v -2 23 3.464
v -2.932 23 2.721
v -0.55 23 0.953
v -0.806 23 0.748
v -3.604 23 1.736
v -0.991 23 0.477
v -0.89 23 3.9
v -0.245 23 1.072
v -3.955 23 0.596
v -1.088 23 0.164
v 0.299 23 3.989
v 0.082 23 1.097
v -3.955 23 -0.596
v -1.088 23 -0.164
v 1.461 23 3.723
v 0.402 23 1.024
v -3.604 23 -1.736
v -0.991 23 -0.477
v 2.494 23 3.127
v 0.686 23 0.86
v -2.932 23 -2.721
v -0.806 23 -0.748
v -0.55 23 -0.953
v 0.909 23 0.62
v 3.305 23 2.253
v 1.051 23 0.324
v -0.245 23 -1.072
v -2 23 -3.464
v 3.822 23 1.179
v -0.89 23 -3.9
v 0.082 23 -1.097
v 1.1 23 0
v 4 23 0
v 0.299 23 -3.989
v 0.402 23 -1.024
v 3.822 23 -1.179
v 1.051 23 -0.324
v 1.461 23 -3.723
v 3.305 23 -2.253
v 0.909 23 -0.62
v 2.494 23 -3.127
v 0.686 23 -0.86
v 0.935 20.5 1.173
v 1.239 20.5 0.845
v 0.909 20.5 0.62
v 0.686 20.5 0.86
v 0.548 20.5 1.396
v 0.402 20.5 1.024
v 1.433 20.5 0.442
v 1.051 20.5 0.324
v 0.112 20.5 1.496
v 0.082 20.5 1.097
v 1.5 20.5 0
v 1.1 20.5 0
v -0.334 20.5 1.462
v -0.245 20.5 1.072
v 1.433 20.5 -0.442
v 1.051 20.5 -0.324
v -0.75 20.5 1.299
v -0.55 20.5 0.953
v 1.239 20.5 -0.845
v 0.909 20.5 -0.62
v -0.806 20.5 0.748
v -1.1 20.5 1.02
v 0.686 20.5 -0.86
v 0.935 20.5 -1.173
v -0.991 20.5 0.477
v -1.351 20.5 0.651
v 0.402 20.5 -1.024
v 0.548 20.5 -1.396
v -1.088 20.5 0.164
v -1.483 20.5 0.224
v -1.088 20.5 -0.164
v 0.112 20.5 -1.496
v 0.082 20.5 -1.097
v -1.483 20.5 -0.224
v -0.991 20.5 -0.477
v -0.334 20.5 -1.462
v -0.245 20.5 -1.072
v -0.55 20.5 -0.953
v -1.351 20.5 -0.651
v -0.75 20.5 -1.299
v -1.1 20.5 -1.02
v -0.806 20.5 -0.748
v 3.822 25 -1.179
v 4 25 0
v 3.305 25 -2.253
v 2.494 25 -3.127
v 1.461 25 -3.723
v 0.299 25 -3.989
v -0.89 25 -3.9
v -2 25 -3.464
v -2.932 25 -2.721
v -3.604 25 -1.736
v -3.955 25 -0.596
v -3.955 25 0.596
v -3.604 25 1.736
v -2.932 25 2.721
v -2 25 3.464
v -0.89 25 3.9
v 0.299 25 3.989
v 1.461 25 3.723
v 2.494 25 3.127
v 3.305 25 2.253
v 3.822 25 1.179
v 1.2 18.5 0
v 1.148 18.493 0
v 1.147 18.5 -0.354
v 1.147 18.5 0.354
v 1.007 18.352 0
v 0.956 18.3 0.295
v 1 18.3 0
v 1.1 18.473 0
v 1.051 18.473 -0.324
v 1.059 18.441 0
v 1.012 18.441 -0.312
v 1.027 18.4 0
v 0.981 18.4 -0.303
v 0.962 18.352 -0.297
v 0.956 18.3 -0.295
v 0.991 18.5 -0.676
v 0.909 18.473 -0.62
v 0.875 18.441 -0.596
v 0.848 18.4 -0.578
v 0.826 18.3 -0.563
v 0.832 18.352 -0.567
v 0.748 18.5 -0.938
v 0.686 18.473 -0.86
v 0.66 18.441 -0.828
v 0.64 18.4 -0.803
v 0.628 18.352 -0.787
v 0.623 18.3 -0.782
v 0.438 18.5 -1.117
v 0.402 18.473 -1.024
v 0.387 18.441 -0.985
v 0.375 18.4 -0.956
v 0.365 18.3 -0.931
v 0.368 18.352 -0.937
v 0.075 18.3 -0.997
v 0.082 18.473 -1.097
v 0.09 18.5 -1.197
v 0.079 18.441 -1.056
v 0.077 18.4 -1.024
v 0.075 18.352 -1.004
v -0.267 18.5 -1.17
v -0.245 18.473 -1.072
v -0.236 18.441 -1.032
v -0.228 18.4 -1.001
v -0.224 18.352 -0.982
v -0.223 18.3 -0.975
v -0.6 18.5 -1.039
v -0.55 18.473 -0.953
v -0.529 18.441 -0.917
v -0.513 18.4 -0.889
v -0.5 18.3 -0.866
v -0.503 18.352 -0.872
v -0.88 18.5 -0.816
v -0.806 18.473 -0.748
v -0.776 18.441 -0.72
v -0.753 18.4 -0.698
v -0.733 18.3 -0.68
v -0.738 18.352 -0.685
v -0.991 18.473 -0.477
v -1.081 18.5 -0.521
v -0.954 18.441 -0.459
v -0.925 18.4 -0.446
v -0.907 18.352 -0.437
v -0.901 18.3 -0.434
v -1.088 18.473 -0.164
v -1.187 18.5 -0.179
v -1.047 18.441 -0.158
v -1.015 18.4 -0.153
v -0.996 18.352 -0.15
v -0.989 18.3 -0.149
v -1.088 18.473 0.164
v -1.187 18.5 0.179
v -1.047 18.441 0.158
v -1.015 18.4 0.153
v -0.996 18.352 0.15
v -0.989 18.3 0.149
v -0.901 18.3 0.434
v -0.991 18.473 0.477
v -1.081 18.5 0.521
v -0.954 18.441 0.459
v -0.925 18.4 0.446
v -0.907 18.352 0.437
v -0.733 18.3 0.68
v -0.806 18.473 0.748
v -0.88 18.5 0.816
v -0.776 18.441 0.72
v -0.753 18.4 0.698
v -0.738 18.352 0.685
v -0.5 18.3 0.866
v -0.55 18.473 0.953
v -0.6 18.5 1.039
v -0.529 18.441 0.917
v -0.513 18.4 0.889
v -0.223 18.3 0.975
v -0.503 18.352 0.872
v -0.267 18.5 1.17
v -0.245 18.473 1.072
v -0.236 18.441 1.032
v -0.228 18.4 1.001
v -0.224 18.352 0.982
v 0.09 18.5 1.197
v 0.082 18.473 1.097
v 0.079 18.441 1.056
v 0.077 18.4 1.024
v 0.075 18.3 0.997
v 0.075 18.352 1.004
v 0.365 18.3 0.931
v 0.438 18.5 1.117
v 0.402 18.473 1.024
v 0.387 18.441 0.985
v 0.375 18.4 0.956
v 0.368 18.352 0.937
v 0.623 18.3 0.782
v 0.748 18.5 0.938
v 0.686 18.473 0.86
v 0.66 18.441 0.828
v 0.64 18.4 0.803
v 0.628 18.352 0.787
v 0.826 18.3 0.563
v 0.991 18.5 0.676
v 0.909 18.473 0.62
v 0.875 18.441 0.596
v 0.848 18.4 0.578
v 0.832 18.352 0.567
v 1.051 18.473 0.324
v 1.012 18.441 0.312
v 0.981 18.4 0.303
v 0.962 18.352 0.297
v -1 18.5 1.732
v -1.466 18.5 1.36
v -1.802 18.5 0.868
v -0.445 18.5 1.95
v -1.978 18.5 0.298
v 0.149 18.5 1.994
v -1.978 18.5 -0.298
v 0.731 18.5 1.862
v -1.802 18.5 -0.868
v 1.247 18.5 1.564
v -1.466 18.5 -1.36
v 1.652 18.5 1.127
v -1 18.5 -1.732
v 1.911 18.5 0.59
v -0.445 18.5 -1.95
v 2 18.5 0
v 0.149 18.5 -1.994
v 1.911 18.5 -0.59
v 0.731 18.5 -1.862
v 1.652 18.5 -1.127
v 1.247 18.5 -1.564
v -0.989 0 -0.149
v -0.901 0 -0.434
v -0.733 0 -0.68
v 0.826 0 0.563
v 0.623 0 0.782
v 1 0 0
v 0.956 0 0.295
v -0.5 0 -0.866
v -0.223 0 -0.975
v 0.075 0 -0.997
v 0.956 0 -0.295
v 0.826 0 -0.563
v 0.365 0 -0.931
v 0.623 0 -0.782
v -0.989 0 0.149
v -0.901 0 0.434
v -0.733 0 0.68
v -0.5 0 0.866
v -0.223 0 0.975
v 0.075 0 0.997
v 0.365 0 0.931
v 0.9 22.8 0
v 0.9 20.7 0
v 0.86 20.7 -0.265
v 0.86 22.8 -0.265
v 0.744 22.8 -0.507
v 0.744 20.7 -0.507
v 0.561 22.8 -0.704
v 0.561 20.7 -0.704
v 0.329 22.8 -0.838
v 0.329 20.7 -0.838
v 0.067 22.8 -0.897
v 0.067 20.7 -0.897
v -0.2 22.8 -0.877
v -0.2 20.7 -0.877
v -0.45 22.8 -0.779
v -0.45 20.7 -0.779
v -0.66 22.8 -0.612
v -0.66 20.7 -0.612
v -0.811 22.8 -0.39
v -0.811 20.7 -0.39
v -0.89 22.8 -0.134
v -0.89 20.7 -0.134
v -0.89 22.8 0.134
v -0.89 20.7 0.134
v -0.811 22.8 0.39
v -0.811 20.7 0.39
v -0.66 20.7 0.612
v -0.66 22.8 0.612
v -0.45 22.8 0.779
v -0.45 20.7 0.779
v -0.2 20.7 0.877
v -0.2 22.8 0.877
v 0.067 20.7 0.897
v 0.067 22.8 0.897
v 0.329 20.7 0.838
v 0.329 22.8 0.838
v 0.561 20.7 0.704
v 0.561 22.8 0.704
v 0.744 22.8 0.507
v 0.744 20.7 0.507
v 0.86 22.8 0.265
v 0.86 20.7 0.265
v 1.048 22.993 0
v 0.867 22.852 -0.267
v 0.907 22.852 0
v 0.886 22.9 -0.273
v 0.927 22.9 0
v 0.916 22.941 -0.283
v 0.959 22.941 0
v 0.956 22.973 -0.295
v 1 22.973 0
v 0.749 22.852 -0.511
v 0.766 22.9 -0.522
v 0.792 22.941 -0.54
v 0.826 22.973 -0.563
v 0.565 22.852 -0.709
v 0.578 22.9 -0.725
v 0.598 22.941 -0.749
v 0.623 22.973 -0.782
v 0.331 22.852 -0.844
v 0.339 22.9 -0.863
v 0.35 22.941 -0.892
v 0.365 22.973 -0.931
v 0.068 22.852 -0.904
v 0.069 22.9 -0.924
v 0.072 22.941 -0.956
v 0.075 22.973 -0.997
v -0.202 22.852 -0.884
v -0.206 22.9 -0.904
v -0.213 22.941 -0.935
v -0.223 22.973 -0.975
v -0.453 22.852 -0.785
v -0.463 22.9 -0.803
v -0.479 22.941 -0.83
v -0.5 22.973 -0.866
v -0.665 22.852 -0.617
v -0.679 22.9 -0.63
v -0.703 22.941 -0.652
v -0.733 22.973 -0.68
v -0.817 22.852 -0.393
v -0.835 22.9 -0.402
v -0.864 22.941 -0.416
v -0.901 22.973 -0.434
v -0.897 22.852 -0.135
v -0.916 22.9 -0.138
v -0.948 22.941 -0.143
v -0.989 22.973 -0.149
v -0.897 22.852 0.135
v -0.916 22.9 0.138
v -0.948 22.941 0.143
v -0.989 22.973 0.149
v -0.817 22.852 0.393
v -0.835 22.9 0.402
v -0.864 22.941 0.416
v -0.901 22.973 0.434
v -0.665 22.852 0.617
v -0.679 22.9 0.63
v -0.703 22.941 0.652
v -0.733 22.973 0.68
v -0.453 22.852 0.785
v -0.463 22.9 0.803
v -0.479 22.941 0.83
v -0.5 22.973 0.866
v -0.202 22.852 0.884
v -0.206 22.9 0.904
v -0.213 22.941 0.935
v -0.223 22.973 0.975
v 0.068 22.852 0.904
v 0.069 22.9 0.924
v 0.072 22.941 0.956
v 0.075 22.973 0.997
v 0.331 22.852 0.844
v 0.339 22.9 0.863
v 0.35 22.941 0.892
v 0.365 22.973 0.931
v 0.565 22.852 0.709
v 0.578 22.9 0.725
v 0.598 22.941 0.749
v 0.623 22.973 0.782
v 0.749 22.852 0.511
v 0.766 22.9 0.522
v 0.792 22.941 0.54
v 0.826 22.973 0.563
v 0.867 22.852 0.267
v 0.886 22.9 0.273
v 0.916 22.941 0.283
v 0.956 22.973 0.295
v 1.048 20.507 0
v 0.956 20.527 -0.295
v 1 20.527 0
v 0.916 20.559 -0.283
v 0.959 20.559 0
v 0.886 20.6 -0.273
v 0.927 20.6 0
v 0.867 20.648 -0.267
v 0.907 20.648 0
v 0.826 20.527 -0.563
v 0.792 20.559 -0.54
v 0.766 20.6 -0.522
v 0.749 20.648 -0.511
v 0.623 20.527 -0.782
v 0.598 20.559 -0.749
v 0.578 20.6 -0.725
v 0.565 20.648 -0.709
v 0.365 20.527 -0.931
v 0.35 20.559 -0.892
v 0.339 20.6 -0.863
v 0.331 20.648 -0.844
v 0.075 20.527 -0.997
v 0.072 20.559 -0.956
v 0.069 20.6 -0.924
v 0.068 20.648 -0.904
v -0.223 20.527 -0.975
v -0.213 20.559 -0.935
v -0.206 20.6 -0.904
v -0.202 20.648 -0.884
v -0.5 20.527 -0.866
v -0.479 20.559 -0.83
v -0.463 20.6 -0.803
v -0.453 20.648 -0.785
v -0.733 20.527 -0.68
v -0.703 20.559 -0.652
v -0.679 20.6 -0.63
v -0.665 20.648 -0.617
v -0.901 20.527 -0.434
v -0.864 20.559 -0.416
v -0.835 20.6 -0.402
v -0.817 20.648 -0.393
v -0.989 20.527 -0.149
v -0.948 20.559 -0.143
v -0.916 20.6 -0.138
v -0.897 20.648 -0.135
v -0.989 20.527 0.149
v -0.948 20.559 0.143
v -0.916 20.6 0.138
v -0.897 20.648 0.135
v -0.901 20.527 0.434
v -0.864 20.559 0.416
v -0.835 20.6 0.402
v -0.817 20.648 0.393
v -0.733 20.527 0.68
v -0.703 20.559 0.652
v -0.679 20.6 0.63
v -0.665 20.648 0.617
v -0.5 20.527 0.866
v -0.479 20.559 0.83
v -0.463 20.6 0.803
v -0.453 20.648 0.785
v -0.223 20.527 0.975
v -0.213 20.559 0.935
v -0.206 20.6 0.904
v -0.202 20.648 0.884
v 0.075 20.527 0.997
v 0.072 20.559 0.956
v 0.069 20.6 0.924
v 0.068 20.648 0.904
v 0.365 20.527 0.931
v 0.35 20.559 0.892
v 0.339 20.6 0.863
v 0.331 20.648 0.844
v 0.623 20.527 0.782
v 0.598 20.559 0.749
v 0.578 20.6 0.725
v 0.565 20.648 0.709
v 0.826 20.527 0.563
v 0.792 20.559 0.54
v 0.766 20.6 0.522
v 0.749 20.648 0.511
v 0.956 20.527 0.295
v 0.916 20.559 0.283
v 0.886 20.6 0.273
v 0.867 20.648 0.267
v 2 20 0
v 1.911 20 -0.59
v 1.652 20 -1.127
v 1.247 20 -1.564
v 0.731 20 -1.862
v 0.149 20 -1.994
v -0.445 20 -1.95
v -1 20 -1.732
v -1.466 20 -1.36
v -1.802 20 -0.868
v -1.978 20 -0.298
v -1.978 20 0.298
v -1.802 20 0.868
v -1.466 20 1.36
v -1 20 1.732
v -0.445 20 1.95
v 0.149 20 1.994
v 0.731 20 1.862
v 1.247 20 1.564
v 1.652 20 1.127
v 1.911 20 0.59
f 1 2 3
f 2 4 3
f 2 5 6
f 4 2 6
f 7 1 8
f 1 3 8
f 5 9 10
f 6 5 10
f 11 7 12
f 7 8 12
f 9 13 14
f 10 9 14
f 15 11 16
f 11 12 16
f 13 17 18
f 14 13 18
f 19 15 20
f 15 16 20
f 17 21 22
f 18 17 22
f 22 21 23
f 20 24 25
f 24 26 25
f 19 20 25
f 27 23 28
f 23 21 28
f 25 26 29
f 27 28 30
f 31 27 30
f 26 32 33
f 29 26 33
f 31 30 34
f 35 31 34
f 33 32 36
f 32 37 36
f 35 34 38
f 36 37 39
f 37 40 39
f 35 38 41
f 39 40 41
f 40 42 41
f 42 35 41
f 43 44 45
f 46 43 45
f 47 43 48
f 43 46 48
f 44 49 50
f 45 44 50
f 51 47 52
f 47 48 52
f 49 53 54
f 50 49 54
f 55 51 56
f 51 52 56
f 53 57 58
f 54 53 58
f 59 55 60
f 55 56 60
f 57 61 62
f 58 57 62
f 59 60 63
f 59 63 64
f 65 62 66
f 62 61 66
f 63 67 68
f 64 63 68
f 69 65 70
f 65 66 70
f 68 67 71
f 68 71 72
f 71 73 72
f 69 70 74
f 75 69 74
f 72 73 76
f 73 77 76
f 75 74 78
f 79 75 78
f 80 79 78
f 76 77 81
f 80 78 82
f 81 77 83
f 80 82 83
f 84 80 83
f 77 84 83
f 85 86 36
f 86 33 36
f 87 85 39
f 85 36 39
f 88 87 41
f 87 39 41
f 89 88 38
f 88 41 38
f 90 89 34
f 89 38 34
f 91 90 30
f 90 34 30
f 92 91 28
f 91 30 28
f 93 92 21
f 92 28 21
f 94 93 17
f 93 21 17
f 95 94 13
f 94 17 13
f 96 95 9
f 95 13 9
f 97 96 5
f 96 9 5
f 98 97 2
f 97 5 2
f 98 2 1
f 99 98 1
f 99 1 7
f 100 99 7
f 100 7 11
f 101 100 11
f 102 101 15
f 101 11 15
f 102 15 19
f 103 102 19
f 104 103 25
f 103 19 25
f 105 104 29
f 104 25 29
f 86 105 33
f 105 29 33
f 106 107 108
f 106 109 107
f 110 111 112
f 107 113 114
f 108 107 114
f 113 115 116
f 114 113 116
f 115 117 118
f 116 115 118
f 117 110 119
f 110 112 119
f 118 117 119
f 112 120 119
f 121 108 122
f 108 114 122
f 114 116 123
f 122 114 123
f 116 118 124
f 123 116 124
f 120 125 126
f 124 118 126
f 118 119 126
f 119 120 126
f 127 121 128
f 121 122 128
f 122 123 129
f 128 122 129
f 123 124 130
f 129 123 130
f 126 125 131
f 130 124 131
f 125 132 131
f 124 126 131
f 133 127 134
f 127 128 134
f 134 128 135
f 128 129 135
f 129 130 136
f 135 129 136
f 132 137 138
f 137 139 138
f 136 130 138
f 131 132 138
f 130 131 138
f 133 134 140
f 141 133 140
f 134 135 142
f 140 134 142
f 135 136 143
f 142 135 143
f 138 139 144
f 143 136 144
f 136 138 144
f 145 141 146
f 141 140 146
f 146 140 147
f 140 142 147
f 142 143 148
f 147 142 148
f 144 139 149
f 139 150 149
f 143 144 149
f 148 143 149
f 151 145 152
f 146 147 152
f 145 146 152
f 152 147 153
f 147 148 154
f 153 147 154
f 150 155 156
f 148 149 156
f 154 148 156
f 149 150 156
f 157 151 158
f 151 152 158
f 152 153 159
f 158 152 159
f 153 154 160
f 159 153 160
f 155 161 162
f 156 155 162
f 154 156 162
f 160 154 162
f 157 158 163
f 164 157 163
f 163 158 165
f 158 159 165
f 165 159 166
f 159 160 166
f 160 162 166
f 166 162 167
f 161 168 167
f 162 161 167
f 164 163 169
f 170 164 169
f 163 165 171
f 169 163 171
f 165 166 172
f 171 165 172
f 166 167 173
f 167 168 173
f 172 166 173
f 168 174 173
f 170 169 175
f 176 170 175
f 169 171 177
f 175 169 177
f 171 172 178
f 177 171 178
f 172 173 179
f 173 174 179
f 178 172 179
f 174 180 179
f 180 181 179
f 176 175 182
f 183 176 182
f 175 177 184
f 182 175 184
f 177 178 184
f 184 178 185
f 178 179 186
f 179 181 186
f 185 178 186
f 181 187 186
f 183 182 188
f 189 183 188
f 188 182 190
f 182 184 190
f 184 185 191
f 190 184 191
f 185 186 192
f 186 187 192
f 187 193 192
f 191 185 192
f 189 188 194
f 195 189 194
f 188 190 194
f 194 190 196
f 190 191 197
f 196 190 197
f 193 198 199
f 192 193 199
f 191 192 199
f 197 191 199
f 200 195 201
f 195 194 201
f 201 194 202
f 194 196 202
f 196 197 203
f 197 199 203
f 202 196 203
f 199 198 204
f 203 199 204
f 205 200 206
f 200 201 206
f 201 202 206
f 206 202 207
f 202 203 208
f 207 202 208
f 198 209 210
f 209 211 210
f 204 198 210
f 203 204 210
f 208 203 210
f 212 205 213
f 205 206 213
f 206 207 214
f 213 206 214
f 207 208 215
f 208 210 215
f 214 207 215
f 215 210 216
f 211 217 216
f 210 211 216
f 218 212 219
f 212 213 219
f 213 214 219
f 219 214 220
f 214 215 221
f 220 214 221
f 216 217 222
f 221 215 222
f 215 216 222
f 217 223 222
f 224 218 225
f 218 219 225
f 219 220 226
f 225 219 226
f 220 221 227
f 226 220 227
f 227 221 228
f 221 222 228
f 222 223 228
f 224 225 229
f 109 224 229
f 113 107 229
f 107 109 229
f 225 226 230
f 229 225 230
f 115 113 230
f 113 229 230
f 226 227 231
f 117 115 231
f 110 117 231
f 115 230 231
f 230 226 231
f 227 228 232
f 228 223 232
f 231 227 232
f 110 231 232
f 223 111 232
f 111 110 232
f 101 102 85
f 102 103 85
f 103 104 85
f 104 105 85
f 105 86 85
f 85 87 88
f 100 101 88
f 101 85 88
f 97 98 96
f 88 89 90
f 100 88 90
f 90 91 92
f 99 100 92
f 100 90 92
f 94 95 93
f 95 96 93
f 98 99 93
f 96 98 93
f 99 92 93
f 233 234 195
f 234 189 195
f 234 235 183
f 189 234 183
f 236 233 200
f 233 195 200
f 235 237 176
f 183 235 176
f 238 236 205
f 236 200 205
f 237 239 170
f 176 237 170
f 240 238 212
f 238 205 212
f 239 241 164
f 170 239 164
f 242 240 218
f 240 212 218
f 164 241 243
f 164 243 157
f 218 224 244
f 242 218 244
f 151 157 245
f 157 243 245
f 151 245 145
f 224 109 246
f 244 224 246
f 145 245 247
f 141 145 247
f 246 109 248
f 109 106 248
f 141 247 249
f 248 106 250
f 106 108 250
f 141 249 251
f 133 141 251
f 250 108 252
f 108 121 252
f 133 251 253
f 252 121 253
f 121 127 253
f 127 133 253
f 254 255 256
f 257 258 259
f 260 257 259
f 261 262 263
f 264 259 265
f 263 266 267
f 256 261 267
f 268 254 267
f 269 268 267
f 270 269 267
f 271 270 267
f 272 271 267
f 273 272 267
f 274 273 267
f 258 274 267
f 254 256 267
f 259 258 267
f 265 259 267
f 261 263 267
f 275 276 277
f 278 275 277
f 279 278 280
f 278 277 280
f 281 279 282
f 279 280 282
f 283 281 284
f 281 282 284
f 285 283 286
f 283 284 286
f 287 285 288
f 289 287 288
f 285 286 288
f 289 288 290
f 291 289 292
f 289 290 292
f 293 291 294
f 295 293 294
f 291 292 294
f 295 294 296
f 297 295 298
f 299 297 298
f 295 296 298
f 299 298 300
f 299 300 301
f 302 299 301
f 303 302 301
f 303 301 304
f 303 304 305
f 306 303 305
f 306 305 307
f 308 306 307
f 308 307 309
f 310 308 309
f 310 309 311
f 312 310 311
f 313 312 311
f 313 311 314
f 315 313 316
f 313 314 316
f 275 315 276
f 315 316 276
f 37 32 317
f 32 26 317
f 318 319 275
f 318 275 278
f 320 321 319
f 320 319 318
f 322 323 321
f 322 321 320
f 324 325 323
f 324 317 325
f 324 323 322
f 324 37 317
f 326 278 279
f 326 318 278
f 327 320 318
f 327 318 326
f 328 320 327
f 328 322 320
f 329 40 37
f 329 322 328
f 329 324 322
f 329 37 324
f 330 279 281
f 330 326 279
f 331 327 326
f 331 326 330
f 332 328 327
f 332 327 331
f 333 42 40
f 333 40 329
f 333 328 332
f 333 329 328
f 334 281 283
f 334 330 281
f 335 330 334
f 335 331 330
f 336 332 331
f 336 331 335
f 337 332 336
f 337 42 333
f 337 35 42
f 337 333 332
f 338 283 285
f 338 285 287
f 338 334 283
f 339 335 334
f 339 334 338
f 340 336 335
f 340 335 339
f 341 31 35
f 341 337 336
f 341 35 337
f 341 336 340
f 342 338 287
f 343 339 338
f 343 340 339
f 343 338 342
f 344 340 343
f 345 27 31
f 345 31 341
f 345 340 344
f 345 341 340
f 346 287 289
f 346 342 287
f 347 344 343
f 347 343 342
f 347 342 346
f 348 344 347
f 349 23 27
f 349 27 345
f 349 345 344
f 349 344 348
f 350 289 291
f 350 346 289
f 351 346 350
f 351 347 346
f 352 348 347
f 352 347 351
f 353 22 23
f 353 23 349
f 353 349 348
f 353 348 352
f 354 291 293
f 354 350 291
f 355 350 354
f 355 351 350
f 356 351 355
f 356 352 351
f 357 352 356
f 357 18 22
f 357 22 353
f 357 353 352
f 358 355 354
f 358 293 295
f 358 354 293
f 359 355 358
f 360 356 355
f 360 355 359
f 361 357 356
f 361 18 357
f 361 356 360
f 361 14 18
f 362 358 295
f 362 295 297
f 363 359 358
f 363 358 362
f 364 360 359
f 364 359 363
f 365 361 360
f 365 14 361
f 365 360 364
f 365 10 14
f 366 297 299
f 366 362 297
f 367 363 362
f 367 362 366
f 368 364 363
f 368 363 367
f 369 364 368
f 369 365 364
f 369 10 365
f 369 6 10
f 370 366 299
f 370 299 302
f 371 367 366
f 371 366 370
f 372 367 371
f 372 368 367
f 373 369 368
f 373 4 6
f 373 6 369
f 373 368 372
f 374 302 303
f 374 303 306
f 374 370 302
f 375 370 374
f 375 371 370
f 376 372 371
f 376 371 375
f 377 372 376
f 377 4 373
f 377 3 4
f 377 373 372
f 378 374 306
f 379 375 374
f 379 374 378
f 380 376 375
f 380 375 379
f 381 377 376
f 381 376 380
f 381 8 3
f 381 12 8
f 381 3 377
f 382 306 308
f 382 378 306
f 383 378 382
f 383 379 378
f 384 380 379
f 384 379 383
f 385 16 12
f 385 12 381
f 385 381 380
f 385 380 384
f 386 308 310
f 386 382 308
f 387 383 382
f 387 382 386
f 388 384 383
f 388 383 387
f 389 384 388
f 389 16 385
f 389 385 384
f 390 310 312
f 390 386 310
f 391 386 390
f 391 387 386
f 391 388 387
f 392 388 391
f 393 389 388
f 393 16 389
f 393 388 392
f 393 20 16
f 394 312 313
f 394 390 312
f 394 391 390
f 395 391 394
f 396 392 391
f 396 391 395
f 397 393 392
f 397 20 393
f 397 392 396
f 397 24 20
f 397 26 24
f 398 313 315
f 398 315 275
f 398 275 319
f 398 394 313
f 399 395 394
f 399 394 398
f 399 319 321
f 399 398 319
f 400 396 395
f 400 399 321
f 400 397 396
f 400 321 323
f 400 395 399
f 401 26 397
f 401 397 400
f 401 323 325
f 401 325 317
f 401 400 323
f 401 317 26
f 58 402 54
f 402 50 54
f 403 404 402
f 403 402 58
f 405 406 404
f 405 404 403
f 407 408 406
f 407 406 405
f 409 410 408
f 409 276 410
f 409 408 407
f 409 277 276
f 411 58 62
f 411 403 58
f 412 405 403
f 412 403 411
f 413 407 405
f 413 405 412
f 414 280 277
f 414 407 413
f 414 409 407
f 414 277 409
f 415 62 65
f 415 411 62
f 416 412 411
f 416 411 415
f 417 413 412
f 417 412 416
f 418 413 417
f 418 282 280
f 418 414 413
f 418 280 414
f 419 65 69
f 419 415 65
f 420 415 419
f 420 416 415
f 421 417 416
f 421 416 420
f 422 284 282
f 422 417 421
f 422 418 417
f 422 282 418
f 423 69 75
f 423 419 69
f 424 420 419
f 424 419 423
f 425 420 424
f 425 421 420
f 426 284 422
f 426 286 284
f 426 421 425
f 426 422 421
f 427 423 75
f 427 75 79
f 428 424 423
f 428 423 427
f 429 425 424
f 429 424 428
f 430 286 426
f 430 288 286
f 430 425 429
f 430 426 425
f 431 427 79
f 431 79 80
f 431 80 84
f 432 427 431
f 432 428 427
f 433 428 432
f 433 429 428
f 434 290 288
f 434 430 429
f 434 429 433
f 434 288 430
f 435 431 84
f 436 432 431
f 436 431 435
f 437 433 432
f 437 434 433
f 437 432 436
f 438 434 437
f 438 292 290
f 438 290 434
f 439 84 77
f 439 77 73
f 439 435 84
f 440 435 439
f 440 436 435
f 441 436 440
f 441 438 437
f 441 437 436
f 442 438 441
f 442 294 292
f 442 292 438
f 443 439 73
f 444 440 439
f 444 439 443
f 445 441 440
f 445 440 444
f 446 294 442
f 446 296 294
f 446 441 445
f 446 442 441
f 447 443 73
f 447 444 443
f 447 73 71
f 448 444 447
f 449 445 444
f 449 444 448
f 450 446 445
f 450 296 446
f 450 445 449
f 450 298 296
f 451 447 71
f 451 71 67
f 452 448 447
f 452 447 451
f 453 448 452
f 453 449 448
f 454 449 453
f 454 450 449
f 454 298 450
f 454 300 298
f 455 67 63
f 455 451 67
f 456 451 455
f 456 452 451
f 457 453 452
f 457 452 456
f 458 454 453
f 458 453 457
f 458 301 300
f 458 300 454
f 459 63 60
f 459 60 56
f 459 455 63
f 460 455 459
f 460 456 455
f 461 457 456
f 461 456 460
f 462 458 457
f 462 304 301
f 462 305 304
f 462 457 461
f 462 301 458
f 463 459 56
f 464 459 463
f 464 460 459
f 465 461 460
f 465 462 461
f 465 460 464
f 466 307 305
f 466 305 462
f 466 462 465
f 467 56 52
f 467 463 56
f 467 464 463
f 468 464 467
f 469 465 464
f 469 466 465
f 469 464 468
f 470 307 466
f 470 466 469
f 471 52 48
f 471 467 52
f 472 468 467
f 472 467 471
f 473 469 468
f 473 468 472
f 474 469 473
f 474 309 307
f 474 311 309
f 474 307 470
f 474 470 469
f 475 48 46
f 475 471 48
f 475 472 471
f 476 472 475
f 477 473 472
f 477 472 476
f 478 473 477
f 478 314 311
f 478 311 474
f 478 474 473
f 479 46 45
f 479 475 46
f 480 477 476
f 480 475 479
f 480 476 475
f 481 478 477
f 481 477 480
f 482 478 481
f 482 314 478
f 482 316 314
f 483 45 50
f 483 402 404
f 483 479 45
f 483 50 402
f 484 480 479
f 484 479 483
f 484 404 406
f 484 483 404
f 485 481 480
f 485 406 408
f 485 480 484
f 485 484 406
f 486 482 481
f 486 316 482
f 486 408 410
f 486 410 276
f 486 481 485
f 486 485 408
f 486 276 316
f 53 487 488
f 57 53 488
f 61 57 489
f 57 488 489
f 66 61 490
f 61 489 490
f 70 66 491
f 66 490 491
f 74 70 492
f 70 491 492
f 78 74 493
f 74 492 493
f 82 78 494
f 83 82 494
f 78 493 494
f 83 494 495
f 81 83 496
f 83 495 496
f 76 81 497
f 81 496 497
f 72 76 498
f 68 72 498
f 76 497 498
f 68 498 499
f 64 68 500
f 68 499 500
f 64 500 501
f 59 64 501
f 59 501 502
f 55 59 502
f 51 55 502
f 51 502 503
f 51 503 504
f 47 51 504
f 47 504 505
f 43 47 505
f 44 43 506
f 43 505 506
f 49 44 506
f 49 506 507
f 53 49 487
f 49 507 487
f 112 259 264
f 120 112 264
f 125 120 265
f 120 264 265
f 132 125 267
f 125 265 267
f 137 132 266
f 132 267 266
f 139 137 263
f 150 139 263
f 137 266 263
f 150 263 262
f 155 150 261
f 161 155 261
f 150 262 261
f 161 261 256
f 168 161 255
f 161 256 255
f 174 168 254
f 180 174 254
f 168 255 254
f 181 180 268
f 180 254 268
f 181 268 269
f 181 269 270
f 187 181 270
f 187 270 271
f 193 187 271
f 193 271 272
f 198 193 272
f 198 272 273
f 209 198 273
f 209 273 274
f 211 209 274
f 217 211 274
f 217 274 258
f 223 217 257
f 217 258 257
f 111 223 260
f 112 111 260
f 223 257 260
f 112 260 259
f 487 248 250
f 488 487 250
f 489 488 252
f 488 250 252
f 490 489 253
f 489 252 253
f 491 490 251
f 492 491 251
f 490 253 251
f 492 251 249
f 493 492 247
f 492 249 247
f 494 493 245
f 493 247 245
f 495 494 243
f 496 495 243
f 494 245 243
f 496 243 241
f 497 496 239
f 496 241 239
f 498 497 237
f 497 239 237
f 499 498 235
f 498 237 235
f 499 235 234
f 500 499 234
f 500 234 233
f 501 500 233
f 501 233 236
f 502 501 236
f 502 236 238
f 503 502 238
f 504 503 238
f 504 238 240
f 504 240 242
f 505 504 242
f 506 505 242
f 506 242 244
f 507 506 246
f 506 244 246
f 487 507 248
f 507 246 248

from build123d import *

# Parameters (mm, degrees)
CHAMFER1_SIZE = 0.5
FILLET1_R     = 0.2


with BuildPart() as part:
    # Sketch2 → Revolve1 (revolve)
    with BuildSketch(Plane.XY):
        Polygon((0, 0), (0, 25), (4, 25), (4, 23), (0.9, 23), (0.9, 20.5), (2, 20.5), (2, 18.5), (1, 18.5), (1, 0), align=None)
    revolve(axis=Axis((0, 0, 0), (0, 1, 0)))

    # Chamfer1
    chamfer1_edges = [part.edges().sort_by_distance(p)[0] for p in [
        (-2, 20.5, 0),
    ]]
    chamfer(chamfer1_edges, length=CHAMFER1_SIZE)

    # Fillet1
    fillet1_edges = [part.edges().sort_by_distance(p)[0] for p in [
        (-0.9, 23, 0),
        (-1, 18.5, 0),
        (-0.9, 20.5, 0),
    ]]
    fillet(fillet1_edges, radius=FILLET1_R)


solid = part.part
